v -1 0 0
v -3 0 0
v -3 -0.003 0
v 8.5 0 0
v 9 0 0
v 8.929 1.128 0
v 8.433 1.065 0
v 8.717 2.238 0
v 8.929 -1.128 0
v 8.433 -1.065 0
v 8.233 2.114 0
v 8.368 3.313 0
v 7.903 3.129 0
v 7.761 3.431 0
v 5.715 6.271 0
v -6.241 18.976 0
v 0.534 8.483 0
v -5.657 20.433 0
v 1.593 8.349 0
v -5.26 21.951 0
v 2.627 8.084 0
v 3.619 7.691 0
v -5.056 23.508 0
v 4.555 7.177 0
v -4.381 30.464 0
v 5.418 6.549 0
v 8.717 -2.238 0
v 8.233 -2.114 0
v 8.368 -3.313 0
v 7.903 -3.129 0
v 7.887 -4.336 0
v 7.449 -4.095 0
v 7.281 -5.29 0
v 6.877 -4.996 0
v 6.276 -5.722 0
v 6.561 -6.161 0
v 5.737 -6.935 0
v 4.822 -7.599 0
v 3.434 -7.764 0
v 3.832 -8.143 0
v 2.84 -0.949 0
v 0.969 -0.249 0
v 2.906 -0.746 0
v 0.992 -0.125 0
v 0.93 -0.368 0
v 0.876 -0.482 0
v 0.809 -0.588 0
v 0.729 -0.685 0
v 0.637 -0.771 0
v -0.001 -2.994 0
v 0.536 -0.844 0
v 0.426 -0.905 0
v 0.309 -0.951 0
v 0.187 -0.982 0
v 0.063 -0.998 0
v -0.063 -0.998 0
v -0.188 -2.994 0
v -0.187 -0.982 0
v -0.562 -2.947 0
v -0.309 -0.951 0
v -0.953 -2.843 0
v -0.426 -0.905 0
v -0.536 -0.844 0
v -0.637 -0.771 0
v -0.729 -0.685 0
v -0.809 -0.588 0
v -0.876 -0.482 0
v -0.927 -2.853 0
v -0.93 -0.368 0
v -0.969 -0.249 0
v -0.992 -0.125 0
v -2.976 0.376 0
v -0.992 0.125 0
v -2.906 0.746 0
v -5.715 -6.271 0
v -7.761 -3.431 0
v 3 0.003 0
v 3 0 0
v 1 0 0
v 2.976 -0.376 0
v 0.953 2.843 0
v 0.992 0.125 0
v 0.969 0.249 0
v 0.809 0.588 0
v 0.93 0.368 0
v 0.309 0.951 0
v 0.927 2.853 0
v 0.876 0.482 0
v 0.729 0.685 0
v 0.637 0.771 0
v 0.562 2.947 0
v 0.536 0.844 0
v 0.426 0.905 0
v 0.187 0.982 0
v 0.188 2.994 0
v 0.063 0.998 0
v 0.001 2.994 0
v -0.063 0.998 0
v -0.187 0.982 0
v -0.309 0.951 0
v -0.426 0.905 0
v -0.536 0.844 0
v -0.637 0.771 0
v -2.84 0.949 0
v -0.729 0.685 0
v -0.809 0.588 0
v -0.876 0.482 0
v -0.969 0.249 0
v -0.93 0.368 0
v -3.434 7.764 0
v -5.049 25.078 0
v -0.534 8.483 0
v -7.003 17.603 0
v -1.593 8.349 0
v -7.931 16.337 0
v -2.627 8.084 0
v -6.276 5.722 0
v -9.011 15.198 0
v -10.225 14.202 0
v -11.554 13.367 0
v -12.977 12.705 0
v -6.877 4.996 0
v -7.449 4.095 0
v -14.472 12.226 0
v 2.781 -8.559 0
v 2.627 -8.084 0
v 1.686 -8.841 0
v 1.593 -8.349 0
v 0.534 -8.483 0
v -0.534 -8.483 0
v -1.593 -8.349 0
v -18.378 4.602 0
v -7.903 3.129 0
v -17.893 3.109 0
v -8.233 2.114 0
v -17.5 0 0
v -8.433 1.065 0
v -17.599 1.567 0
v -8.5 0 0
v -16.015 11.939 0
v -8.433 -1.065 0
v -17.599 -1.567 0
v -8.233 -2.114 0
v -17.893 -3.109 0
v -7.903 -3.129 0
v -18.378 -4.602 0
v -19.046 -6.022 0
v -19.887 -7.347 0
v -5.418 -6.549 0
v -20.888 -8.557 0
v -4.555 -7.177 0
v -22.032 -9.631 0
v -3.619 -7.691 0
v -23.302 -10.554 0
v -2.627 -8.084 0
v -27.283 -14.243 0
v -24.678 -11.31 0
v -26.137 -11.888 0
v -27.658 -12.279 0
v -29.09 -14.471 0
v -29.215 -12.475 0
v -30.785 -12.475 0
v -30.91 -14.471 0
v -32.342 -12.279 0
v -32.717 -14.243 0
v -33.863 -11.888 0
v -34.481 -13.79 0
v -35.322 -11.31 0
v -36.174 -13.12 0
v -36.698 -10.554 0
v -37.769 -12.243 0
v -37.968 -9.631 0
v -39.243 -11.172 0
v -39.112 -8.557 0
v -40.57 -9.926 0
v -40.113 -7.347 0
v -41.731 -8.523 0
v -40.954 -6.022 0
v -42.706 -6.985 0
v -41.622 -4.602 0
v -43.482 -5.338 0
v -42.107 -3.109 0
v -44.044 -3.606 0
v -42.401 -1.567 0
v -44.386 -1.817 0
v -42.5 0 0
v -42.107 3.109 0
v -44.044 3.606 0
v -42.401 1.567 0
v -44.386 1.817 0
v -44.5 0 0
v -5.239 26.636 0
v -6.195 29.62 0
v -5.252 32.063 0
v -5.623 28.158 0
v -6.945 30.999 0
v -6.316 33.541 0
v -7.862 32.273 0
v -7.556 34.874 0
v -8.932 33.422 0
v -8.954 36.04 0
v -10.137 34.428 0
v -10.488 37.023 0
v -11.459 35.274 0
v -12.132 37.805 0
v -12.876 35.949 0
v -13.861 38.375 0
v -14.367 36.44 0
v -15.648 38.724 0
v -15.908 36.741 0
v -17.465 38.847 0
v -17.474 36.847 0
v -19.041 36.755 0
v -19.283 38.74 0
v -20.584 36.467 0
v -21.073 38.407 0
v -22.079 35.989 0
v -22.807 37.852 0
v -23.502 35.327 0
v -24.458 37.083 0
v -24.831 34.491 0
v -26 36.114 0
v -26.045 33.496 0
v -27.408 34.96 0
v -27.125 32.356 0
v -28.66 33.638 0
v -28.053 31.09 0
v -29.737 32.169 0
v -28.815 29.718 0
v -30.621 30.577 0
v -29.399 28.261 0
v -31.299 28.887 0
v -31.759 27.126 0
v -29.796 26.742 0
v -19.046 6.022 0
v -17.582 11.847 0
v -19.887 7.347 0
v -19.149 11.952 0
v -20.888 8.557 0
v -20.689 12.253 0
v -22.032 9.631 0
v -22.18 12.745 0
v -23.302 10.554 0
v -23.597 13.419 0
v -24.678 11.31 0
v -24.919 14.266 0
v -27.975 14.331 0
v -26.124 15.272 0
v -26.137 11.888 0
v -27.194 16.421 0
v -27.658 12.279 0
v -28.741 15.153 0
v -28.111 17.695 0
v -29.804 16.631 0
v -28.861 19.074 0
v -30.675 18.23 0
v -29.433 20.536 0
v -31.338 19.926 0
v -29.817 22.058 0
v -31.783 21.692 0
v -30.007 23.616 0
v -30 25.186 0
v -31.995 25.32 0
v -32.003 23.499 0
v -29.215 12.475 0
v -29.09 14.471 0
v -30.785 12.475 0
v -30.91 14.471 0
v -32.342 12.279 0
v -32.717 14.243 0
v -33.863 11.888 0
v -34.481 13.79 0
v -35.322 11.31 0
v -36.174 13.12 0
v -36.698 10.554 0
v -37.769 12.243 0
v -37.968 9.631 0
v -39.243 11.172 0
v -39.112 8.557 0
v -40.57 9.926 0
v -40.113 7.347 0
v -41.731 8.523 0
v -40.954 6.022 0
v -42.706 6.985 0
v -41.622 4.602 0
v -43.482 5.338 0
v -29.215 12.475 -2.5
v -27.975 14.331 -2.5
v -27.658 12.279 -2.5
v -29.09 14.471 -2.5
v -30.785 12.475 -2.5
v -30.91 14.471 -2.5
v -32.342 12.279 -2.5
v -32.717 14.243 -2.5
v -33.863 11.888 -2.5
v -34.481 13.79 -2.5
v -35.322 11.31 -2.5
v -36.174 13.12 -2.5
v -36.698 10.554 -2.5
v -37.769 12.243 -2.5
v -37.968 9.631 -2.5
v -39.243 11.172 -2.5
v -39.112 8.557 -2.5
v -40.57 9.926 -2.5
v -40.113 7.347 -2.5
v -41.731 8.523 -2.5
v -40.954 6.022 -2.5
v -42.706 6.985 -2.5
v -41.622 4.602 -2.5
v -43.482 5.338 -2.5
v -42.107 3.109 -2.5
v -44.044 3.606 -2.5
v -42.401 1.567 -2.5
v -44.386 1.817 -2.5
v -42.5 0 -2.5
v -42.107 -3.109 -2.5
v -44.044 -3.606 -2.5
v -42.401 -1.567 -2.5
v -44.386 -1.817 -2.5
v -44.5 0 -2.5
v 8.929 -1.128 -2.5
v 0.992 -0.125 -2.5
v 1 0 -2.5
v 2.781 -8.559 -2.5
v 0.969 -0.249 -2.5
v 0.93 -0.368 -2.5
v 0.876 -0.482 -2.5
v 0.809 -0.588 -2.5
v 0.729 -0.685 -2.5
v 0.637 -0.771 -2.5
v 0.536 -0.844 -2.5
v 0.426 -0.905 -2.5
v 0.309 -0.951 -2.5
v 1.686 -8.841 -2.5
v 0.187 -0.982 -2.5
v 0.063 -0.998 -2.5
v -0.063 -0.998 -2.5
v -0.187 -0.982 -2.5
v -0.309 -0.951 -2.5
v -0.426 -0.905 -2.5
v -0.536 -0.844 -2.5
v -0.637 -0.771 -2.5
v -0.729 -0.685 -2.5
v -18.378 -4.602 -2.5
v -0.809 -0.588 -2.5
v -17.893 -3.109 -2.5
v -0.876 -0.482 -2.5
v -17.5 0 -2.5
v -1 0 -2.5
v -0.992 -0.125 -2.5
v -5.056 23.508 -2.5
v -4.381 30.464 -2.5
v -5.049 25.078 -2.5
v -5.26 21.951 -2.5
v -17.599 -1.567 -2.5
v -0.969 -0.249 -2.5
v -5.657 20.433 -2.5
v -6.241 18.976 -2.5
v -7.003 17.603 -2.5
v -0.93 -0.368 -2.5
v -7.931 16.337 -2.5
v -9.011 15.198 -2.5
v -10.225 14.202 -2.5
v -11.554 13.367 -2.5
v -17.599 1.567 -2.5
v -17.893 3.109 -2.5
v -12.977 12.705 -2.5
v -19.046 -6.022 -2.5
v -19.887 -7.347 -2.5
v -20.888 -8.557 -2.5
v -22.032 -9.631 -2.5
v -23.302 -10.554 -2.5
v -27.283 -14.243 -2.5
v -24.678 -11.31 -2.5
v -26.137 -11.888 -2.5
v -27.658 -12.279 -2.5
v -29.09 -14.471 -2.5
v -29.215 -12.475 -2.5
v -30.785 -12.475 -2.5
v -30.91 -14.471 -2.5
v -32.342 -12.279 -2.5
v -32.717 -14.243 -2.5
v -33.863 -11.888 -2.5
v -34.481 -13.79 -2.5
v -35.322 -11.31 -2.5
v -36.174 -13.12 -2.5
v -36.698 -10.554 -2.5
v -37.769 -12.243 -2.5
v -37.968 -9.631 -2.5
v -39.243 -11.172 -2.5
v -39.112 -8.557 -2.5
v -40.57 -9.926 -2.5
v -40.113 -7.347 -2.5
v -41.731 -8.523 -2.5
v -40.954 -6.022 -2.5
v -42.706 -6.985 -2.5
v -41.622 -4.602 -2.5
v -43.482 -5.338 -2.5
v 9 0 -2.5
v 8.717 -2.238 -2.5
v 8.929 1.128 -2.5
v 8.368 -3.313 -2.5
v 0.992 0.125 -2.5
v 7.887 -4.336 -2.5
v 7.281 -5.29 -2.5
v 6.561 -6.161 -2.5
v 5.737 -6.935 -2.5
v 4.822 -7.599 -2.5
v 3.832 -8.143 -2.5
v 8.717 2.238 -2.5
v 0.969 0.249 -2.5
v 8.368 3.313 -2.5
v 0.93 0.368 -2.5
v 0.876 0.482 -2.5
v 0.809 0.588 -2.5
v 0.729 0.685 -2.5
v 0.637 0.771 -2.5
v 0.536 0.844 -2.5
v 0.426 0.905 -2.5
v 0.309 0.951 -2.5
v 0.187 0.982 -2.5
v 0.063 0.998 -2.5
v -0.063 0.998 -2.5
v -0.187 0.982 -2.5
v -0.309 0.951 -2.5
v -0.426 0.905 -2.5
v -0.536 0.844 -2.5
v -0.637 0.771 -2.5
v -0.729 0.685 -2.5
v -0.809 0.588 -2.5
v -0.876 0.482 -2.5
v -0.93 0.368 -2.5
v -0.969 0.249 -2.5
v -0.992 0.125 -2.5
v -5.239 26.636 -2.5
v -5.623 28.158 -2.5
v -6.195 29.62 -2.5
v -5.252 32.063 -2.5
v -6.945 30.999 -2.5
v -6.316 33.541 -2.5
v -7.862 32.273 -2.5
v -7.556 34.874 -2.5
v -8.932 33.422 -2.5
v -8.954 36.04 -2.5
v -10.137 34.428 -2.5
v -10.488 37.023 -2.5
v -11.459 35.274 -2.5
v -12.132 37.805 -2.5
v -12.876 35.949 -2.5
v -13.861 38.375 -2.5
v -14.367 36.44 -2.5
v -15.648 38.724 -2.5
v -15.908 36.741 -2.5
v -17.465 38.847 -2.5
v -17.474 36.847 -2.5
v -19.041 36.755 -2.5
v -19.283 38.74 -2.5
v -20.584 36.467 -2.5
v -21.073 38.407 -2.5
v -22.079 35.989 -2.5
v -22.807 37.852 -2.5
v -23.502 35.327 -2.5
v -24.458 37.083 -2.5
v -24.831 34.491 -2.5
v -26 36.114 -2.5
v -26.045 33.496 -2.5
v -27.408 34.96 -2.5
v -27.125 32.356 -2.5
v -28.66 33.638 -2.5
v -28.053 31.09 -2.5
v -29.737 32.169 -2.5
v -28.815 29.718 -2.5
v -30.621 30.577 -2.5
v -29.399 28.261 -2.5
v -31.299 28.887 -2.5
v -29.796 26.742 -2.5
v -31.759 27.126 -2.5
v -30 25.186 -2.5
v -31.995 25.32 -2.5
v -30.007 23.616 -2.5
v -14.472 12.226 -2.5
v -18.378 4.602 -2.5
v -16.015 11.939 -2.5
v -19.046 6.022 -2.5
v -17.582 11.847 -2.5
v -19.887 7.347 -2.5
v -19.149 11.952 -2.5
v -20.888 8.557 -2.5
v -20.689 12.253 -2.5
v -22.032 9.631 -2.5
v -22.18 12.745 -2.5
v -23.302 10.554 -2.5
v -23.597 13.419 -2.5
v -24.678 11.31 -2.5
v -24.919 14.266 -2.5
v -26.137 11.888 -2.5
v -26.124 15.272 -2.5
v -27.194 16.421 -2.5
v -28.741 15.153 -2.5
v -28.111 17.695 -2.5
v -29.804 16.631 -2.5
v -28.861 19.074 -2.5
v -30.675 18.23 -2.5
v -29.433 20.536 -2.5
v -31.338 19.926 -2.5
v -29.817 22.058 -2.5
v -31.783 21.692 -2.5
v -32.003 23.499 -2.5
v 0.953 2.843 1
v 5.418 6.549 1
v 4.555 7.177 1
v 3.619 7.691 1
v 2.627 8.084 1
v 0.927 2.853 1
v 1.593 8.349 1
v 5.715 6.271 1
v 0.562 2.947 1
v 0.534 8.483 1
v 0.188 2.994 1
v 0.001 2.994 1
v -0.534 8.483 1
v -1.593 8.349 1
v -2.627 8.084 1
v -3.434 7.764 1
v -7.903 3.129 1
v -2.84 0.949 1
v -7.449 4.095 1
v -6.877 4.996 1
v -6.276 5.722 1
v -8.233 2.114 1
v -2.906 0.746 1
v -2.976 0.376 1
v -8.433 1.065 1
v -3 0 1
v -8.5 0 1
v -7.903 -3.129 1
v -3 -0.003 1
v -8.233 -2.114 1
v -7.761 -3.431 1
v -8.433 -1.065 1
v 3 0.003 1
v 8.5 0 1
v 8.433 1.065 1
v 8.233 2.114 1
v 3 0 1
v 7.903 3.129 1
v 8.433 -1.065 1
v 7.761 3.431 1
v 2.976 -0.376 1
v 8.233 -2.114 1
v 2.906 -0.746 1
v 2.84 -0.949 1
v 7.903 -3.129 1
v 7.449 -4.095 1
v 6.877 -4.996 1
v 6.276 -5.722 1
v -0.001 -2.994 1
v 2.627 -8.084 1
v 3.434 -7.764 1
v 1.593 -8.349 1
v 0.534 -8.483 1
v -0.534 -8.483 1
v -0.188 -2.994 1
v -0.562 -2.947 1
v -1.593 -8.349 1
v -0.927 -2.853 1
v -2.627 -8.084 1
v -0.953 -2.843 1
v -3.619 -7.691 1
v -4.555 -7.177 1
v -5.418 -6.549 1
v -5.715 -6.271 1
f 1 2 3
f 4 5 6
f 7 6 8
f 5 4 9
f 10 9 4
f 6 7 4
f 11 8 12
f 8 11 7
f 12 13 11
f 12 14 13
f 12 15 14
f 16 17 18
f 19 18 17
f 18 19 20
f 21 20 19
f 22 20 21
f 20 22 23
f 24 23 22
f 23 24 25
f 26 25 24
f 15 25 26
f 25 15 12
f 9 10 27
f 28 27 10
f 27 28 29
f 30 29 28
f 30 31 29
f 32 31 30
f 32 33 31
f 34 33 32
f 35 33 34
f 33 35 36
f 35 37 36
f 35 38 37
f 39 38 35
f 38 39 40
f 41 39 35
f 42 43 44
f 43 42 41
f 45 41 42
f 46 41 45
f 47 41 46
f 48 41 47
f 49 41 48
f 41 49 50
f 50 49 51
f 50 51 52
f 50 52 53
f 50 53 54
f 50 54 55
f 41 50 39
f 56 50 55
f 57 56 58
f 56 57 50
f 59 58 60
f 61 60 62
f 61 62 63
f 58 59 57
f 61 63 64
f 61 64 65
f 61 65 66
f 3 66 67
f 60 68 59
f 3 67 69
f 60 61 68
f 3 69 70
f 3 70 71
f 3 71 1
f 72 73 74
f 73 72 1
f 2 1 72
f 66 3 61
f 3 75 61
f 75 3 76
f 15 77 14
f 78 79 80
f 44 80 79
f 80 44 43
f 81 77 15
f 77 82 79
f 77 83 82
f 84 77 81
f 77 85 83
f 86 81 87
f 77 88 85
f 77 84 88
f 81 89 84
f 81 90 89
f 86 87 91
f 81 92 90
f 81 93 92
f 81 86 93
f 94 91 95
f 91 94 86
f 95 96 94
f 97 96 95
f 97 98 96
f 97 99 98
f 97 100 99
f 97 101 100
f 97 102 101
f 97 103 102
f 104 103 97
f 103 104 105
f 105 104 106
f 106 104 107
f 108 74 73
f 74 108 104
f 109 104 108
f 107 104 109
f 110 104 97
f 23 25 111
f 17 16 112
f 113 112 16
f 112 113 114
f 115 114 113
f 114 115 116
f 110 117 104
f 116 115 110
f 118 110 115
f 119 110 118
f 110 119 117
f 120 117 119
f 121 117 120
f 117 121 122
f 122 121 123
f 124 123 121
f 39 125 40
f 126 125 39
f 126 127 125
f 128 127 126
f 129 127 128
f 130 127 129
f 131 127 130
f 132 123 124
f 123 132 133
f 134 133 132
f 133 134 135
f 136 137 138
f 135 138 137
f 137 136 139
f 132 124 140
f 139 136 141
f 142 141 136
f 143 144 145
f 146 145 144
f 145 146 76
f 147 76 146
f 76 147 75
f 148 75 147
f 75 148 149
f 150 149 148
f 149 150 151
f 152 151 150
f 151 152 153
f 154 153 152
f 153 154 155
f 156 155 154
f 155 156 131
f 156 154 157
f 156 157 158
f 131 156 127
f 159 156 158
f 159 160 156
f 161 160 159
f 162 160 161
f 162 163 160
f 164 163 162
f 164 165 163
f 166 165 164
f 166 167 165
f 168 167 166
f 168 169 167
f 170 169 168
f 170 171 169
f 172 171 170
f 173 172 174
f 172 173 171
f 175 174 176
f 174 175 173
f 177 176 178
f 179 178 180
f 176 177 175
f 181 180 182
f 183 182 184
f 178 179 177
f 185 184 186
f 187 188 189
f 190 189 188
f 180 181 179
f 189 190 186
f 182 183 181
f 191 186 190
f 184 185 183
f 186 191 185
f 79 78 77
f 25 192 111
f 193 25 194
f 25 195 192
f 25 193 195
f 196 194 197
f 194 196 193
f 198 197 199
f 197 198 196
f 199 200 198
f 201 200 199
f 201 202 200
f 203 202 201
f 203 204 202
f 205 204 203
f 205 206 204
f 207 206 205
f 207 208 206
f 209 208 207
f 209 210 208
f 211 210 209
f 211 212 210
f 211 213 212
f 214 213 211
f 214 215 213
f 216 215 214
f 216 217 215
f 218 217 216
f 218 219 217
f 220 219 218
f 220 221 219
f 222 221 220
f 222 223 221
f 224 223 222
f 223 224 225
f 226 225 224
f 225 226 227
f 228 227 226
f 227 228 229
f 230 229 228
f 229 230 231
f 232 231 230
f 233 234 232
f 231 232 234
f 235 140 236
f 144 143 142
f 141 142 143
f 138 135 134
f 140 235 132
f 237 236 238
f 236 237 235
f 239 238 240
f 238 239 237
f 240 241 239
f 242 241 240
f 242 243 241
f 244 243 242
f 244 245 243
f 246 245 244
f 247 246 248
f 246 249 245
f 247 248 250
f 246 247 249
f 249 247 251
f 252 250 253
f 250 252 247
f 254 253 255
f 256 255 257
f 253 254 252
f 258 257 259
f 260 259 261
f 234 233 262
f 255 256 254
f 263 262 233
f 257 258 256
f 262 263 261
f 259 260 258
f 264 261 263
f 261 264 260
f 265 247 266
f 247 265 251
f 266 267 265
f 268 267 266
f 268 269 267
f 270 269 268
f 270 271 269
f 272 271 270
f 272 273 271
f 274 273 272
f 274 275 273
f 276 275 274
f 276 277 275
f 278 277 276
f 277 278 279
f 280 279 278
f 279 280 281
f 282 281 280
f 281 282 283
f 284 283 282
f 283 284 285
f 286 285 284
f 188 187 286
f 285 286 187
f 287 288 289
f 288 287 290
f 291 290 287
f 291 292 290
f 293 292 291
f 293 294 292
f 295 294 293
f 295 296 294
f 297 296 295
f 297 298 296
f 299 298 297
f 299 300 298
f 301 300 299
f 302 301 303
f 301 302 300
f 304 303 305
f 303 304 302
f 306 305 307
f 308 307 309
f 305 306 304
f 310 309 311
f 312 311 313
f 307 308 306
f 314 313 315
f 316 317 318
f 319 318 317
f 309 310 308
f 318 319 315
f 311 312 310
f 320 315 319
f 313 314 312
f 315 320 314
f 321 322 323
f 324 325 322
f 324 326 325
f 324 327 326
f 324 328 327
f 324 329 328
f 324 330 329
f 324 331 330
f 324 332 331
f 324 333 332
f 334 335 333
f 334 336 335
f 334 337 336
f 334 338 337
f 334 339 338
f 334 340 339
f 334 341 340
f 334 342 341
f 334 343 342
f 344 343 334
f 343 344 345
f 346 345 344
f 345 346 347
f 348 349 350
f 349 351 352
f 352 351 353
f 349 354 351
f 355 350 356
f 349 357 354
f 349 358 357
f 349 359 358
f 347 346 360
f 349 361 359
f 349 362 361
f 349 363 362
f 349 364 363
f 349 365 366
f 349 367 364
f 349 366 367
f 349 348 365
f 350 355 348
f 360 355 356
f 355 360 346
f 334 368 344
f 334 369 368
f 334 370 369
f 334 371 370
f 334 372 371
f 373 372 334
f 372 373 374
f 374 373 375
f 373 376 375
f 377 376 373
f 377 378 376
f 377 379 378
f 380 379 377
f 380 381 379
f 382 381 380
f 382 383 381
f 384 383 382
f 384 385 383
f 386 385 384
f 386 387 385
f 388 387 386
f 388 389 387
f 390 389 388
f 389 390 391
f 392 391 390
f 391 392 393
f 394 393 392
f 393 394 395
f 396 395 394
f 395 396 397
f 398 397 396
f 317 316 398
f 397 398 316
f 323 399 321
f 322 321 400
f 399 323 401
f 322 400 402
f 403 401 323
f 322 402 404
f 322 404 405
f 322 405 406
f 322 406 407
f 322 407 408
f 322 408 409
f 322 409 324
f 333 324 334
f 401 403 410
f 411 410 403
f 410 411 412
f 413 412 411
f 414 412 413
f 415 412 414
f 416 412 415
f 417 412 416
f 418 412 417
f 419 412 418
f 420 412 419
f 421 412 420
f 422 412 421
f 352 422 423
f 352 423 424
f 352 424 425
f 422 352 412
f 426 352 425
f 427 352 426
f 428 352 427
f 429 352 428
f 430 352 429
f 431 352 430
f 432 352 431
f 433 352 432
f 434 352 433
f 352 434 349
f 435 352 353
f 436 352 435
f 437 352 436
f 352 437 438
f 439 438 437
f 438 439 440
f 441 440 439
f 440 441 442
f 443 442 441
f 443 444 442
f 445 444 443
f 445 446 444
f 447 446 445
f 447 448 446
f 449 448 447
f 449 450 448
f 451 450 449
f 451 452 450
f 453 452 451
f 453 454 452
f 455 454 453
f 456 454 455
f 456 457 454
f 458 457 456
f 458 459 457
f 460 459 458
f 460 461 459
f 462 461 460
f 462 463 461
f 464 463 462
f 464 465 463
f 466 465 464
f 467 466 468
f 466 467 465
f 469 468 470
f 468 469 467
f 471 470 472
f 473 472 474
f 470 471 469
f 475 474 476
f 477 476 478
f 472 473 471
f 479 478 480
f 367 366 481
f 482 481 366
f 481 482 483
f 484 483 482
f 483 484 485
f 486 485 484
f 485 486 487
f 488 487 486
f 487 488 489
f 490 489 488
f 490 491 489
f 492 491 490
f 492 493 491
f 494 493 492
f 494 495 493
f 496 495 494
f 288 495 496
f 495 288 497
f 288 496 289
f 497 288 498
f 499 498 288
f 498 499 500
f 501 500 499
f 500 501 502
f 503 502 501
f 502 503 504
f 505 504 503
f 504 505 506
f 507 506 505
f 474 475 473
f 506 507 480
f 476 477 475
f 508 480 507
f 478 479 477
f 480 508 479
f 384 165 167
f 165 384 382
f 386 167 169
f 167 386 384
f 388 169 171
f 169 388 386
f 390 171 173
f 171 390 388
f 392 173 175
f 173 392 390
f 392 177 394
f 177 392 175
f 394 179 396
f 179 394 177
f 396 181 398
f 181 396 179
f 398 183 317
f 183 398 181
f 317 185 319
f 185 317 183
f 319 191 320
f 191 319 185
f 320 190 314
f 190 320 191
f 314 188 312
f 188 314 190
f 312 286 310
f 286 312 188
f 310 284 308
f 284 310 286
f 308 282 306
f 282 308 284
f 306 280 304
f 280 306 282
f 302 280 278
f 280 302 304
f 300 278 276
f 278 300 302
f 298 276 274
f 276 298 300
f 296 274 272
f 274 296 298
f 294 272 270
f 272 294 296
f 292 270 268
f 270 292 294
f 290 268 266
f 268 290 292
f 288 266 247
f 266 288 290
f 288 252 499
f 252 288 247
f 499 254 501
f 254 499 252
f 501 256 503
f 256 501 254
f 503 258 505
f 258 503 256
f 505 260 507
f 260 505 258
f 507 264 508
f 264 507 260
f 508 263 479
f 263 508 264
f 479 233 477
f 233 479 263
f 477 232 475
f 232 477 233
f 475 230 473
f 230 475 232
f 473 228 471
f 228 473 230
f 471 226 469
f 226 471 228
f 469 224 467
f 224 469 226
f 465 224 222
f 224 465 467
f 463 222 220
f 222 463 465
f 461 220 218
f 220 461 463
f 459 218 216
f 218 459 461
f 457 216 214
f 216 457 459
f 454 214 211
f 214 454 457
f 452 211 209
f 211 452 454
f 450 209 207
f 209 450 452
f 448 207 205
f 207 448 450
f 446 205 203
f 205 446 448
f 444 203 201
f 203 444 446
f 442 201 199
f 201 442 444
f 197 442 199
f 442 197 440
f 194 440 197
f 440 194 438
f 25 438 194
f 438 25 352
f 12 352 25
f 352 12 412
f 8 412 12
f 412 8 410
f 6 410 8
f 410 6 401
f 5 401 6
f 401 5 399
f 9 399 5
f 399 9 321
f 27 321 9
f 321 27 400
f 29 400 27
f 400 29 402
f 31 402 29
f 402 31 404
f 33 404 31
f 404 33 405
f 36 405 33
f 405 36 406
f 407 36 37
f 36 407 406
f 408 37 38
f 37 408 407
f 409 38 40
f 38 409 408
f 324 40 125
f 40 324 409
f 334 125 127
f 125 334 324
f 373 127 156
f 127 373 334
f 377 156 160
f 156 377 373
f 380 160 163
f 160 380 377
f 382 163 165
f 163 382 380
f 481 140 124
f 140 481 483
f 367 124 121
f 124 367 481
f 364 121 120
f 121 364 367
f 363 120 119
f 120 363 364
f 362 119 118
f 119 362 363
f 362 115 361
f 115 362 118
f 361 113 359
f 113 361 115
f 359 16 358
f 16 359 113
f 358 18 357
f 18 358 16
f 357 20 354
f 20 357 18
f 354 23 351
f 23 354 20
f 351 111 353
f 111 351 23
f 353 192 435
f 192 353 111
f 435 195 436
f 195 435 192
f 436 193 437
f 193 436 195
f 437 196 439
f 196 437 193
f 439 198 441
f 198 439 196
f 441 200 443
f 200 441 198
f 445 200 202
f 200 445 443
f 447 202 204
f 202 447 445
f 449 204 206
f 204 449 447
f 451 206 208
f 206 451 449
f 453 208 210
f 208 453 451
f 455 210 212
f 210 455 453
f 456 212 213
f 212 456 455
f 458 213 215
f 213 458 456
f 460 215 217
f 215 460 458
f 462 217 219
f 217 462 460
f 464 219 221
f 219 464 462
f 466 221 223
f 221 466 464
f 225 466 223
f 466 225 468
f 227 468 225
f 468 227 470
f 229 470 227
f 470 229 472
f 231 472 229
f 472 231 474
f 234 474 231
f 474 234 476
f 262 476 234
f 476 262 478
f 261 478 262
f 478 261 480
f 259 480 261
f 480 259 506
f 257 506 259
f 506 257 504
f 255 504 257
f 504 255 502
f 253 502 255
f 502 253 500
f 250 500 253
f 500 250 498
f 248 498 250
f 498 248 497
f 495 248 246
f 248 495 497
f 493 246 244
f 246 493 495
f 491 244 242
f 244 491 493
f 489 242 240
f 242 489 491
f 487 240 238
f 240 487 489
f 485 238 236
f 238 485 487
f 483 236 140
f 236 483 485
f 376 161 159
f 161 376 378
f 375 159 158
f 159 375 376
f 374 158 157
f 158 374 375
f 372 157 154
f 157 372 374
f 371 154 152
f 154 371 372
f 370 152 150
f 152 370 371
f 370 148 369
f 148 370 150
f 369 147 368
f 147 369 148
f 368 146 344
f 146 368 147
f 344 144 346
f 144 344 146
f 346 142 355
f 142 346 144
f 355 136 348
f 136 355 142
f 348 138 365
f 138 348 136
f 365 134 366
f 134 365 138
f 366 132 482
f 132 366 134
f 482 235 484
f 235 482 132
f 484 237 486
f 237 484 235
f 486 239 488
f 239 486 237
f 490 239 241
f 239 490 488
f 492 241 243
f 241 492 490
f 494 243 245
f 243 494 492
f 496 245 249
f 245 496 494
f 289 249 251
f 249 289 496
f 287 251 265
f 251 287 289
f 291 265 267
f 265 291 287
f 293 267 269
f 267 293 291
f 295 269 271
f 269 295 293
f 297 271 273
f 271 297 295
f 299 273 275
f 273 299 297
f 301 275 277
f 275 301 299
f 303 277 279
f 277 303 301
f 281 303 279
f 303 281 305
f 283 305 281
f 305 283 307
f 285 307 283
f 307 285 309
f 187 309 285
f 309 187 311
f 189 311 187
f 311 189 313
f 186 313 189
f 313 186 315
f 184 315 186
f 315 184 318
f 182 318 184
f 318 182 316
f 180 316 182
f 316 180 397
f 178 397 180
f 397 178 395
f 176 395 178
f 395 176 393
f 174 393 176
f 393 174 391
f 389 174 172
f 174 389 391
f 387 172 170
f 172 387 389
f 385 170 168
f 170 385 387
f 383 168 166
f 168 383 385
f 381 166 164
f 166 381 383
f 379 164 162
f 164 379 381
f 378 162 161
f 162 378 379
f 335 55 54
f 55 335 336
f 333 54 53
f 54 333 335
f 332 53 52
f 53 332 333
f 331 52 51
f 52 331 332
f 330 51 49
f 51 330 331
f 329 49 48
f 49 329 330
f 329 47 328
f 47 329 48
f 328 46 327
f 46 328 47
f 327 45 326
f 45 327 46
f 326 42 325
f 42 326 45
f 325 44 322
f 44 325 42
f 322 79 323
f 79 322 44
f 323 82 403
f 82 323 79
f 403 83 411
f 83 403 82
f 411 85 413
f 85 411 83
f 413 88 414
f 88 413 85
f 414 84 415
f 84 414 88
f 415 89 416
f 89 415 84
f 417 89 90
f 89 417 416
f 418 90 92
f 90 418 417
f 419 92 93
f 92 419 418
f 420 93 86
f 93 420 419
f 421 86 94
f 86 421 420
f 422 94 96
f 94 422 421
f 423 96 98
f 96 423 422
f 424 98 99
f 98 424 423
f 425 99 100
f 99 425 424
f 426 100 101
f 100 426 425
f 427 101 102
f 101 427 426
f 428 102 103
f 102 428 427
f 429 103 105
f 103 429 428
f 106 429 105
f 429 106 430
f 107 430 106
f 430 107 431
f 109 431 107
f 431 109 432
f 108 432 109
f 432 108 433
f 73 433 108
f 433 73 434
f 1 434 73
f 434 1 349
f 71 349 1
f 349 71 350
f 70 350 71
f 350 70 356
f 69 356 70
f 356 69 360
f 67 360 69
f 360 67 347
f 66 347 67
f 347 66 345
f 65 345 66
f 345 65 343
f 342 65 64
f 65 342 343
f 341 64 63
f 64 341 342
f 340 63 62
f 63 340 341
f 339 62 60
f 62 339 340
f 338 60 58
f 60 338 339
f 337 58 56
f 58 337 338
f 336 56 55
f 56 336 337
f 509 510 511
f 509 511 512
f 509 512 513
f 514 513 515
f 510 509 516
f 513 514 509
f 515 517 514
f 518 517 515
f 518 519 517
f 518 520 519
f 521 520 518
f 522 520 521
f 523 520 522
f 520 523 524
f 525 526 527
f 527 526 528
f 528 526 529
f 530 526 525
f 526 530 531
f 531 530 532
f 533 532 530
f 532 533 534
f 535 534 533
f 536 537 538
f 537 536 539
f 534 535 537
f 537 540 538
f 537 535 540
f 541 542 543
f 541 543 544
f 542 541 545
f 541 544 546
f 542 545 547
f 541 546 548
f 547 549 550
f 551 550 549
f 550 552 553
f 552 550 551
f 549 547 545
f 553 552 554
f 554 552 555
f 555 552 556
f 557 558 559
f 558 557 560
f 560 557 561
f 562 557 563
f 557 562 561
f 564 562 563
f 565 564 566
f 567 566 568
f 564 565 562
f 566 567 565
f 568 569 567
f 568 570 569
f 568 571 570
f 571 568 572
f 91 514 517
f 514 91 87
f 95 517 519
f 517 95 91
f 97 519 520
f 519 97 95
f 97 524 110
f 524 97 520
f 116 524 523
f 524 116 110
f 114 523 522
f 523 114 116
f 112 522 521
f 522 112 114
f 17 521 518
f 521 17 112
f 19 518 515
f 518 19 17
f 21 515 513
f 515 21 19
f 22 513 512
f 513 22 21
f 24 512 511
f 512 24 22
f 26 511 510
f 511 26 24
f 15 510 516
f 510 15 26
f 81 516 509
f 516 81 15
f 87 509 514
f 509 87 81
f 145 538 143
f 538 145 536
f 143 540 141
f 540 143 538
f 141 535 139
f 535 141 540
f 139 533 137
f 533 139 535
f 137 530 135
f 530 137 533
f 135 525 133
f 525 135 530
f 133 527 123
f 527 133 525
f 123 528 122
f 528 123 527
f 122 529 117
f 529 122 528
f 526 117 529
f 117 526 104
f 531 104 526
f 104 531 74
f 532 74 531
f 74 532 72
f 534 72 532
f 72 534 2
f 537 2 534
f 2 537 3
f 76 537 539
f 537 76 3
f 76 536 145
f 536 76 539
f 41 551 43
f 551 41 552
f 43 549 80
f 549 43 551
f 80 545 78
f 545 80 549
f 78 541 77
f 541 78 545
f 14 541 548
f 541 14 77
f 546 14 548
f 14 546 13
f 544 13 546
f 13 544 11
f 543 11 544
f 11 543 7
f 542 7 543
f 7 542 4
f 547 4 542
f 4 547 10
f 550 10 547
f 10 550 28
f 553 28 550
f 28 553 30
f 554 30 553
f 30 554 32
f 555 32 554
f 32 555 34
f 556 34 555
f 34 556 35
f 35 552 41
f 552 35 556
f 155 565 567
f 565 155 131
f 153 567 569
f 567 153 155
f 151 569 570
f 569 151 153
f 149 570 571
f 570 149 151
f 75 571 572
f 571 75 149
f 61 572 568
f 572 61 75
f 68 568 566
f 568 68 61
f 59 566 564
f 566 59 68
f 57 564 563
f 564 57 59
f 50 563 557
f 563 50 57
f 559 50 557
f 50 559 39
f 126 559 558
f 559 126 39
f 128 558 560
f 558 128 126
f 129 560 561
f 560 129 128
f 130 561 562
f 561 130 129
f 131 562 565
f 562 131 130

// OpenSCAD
module filterwheel(nf, R, f_dia=25, draw_filters=false) {
  $fn = 50;
  r = f_dia/2;
  da = 2*asin(r/R) + 5;
  color([0.2, 0.2, 0.2]) {
    linear_extrude(2.5) difference() {
      for (a=[0:da:(nf-1)*da]) hull() {
        circle(d=18);
        rotate([0, 0, a]) translate([R, 0, 0]) circle(d=f_dia+4);
      }
      for (a=[0:da:(nf-1)*da]) {
        rotate([0, 0, a]) translate([R, 0, 0]) circle(d=f_dia);
      }
      circle(d=2); // center screw
    }
    /* rings holding filters */
	/*
    rt=0.6; // ring thickness
    translate([0, 0, -rt]) for (a=[0:da:(nf-1)*da]) {
      rotate([0, 0, a]) translate([R, 0, 0]) linear_extrude(rt) difference() {
        circle(d=f_dia+1);
        circle(d=f_dia-1);
      }
    }
	*/
    /* servo horn mount */
    translate([0, 0, -1]) linear_extrude(1) difference() {
      circle(d=17);
      circle(d=2);
      rotate([0, 0, da]) {
        square([17, 3.5], center=true);
        rotate([0, 0, 90]) square([17, 3.5], center=true);
      }
      circle(d=6);
    }
  }

  /* filters */
  if (draw_filters) color("Aquamarine", alpha=0.3) linear_extrude(2.5) for (a=[0:da:(nf-1)*da]) {
    rotate([0, 0, a]) translate([R, 0, 0]) circle(d=f_dia);
  }
}

rotate([0, 180, 0]) filterwheel(2, 30);
